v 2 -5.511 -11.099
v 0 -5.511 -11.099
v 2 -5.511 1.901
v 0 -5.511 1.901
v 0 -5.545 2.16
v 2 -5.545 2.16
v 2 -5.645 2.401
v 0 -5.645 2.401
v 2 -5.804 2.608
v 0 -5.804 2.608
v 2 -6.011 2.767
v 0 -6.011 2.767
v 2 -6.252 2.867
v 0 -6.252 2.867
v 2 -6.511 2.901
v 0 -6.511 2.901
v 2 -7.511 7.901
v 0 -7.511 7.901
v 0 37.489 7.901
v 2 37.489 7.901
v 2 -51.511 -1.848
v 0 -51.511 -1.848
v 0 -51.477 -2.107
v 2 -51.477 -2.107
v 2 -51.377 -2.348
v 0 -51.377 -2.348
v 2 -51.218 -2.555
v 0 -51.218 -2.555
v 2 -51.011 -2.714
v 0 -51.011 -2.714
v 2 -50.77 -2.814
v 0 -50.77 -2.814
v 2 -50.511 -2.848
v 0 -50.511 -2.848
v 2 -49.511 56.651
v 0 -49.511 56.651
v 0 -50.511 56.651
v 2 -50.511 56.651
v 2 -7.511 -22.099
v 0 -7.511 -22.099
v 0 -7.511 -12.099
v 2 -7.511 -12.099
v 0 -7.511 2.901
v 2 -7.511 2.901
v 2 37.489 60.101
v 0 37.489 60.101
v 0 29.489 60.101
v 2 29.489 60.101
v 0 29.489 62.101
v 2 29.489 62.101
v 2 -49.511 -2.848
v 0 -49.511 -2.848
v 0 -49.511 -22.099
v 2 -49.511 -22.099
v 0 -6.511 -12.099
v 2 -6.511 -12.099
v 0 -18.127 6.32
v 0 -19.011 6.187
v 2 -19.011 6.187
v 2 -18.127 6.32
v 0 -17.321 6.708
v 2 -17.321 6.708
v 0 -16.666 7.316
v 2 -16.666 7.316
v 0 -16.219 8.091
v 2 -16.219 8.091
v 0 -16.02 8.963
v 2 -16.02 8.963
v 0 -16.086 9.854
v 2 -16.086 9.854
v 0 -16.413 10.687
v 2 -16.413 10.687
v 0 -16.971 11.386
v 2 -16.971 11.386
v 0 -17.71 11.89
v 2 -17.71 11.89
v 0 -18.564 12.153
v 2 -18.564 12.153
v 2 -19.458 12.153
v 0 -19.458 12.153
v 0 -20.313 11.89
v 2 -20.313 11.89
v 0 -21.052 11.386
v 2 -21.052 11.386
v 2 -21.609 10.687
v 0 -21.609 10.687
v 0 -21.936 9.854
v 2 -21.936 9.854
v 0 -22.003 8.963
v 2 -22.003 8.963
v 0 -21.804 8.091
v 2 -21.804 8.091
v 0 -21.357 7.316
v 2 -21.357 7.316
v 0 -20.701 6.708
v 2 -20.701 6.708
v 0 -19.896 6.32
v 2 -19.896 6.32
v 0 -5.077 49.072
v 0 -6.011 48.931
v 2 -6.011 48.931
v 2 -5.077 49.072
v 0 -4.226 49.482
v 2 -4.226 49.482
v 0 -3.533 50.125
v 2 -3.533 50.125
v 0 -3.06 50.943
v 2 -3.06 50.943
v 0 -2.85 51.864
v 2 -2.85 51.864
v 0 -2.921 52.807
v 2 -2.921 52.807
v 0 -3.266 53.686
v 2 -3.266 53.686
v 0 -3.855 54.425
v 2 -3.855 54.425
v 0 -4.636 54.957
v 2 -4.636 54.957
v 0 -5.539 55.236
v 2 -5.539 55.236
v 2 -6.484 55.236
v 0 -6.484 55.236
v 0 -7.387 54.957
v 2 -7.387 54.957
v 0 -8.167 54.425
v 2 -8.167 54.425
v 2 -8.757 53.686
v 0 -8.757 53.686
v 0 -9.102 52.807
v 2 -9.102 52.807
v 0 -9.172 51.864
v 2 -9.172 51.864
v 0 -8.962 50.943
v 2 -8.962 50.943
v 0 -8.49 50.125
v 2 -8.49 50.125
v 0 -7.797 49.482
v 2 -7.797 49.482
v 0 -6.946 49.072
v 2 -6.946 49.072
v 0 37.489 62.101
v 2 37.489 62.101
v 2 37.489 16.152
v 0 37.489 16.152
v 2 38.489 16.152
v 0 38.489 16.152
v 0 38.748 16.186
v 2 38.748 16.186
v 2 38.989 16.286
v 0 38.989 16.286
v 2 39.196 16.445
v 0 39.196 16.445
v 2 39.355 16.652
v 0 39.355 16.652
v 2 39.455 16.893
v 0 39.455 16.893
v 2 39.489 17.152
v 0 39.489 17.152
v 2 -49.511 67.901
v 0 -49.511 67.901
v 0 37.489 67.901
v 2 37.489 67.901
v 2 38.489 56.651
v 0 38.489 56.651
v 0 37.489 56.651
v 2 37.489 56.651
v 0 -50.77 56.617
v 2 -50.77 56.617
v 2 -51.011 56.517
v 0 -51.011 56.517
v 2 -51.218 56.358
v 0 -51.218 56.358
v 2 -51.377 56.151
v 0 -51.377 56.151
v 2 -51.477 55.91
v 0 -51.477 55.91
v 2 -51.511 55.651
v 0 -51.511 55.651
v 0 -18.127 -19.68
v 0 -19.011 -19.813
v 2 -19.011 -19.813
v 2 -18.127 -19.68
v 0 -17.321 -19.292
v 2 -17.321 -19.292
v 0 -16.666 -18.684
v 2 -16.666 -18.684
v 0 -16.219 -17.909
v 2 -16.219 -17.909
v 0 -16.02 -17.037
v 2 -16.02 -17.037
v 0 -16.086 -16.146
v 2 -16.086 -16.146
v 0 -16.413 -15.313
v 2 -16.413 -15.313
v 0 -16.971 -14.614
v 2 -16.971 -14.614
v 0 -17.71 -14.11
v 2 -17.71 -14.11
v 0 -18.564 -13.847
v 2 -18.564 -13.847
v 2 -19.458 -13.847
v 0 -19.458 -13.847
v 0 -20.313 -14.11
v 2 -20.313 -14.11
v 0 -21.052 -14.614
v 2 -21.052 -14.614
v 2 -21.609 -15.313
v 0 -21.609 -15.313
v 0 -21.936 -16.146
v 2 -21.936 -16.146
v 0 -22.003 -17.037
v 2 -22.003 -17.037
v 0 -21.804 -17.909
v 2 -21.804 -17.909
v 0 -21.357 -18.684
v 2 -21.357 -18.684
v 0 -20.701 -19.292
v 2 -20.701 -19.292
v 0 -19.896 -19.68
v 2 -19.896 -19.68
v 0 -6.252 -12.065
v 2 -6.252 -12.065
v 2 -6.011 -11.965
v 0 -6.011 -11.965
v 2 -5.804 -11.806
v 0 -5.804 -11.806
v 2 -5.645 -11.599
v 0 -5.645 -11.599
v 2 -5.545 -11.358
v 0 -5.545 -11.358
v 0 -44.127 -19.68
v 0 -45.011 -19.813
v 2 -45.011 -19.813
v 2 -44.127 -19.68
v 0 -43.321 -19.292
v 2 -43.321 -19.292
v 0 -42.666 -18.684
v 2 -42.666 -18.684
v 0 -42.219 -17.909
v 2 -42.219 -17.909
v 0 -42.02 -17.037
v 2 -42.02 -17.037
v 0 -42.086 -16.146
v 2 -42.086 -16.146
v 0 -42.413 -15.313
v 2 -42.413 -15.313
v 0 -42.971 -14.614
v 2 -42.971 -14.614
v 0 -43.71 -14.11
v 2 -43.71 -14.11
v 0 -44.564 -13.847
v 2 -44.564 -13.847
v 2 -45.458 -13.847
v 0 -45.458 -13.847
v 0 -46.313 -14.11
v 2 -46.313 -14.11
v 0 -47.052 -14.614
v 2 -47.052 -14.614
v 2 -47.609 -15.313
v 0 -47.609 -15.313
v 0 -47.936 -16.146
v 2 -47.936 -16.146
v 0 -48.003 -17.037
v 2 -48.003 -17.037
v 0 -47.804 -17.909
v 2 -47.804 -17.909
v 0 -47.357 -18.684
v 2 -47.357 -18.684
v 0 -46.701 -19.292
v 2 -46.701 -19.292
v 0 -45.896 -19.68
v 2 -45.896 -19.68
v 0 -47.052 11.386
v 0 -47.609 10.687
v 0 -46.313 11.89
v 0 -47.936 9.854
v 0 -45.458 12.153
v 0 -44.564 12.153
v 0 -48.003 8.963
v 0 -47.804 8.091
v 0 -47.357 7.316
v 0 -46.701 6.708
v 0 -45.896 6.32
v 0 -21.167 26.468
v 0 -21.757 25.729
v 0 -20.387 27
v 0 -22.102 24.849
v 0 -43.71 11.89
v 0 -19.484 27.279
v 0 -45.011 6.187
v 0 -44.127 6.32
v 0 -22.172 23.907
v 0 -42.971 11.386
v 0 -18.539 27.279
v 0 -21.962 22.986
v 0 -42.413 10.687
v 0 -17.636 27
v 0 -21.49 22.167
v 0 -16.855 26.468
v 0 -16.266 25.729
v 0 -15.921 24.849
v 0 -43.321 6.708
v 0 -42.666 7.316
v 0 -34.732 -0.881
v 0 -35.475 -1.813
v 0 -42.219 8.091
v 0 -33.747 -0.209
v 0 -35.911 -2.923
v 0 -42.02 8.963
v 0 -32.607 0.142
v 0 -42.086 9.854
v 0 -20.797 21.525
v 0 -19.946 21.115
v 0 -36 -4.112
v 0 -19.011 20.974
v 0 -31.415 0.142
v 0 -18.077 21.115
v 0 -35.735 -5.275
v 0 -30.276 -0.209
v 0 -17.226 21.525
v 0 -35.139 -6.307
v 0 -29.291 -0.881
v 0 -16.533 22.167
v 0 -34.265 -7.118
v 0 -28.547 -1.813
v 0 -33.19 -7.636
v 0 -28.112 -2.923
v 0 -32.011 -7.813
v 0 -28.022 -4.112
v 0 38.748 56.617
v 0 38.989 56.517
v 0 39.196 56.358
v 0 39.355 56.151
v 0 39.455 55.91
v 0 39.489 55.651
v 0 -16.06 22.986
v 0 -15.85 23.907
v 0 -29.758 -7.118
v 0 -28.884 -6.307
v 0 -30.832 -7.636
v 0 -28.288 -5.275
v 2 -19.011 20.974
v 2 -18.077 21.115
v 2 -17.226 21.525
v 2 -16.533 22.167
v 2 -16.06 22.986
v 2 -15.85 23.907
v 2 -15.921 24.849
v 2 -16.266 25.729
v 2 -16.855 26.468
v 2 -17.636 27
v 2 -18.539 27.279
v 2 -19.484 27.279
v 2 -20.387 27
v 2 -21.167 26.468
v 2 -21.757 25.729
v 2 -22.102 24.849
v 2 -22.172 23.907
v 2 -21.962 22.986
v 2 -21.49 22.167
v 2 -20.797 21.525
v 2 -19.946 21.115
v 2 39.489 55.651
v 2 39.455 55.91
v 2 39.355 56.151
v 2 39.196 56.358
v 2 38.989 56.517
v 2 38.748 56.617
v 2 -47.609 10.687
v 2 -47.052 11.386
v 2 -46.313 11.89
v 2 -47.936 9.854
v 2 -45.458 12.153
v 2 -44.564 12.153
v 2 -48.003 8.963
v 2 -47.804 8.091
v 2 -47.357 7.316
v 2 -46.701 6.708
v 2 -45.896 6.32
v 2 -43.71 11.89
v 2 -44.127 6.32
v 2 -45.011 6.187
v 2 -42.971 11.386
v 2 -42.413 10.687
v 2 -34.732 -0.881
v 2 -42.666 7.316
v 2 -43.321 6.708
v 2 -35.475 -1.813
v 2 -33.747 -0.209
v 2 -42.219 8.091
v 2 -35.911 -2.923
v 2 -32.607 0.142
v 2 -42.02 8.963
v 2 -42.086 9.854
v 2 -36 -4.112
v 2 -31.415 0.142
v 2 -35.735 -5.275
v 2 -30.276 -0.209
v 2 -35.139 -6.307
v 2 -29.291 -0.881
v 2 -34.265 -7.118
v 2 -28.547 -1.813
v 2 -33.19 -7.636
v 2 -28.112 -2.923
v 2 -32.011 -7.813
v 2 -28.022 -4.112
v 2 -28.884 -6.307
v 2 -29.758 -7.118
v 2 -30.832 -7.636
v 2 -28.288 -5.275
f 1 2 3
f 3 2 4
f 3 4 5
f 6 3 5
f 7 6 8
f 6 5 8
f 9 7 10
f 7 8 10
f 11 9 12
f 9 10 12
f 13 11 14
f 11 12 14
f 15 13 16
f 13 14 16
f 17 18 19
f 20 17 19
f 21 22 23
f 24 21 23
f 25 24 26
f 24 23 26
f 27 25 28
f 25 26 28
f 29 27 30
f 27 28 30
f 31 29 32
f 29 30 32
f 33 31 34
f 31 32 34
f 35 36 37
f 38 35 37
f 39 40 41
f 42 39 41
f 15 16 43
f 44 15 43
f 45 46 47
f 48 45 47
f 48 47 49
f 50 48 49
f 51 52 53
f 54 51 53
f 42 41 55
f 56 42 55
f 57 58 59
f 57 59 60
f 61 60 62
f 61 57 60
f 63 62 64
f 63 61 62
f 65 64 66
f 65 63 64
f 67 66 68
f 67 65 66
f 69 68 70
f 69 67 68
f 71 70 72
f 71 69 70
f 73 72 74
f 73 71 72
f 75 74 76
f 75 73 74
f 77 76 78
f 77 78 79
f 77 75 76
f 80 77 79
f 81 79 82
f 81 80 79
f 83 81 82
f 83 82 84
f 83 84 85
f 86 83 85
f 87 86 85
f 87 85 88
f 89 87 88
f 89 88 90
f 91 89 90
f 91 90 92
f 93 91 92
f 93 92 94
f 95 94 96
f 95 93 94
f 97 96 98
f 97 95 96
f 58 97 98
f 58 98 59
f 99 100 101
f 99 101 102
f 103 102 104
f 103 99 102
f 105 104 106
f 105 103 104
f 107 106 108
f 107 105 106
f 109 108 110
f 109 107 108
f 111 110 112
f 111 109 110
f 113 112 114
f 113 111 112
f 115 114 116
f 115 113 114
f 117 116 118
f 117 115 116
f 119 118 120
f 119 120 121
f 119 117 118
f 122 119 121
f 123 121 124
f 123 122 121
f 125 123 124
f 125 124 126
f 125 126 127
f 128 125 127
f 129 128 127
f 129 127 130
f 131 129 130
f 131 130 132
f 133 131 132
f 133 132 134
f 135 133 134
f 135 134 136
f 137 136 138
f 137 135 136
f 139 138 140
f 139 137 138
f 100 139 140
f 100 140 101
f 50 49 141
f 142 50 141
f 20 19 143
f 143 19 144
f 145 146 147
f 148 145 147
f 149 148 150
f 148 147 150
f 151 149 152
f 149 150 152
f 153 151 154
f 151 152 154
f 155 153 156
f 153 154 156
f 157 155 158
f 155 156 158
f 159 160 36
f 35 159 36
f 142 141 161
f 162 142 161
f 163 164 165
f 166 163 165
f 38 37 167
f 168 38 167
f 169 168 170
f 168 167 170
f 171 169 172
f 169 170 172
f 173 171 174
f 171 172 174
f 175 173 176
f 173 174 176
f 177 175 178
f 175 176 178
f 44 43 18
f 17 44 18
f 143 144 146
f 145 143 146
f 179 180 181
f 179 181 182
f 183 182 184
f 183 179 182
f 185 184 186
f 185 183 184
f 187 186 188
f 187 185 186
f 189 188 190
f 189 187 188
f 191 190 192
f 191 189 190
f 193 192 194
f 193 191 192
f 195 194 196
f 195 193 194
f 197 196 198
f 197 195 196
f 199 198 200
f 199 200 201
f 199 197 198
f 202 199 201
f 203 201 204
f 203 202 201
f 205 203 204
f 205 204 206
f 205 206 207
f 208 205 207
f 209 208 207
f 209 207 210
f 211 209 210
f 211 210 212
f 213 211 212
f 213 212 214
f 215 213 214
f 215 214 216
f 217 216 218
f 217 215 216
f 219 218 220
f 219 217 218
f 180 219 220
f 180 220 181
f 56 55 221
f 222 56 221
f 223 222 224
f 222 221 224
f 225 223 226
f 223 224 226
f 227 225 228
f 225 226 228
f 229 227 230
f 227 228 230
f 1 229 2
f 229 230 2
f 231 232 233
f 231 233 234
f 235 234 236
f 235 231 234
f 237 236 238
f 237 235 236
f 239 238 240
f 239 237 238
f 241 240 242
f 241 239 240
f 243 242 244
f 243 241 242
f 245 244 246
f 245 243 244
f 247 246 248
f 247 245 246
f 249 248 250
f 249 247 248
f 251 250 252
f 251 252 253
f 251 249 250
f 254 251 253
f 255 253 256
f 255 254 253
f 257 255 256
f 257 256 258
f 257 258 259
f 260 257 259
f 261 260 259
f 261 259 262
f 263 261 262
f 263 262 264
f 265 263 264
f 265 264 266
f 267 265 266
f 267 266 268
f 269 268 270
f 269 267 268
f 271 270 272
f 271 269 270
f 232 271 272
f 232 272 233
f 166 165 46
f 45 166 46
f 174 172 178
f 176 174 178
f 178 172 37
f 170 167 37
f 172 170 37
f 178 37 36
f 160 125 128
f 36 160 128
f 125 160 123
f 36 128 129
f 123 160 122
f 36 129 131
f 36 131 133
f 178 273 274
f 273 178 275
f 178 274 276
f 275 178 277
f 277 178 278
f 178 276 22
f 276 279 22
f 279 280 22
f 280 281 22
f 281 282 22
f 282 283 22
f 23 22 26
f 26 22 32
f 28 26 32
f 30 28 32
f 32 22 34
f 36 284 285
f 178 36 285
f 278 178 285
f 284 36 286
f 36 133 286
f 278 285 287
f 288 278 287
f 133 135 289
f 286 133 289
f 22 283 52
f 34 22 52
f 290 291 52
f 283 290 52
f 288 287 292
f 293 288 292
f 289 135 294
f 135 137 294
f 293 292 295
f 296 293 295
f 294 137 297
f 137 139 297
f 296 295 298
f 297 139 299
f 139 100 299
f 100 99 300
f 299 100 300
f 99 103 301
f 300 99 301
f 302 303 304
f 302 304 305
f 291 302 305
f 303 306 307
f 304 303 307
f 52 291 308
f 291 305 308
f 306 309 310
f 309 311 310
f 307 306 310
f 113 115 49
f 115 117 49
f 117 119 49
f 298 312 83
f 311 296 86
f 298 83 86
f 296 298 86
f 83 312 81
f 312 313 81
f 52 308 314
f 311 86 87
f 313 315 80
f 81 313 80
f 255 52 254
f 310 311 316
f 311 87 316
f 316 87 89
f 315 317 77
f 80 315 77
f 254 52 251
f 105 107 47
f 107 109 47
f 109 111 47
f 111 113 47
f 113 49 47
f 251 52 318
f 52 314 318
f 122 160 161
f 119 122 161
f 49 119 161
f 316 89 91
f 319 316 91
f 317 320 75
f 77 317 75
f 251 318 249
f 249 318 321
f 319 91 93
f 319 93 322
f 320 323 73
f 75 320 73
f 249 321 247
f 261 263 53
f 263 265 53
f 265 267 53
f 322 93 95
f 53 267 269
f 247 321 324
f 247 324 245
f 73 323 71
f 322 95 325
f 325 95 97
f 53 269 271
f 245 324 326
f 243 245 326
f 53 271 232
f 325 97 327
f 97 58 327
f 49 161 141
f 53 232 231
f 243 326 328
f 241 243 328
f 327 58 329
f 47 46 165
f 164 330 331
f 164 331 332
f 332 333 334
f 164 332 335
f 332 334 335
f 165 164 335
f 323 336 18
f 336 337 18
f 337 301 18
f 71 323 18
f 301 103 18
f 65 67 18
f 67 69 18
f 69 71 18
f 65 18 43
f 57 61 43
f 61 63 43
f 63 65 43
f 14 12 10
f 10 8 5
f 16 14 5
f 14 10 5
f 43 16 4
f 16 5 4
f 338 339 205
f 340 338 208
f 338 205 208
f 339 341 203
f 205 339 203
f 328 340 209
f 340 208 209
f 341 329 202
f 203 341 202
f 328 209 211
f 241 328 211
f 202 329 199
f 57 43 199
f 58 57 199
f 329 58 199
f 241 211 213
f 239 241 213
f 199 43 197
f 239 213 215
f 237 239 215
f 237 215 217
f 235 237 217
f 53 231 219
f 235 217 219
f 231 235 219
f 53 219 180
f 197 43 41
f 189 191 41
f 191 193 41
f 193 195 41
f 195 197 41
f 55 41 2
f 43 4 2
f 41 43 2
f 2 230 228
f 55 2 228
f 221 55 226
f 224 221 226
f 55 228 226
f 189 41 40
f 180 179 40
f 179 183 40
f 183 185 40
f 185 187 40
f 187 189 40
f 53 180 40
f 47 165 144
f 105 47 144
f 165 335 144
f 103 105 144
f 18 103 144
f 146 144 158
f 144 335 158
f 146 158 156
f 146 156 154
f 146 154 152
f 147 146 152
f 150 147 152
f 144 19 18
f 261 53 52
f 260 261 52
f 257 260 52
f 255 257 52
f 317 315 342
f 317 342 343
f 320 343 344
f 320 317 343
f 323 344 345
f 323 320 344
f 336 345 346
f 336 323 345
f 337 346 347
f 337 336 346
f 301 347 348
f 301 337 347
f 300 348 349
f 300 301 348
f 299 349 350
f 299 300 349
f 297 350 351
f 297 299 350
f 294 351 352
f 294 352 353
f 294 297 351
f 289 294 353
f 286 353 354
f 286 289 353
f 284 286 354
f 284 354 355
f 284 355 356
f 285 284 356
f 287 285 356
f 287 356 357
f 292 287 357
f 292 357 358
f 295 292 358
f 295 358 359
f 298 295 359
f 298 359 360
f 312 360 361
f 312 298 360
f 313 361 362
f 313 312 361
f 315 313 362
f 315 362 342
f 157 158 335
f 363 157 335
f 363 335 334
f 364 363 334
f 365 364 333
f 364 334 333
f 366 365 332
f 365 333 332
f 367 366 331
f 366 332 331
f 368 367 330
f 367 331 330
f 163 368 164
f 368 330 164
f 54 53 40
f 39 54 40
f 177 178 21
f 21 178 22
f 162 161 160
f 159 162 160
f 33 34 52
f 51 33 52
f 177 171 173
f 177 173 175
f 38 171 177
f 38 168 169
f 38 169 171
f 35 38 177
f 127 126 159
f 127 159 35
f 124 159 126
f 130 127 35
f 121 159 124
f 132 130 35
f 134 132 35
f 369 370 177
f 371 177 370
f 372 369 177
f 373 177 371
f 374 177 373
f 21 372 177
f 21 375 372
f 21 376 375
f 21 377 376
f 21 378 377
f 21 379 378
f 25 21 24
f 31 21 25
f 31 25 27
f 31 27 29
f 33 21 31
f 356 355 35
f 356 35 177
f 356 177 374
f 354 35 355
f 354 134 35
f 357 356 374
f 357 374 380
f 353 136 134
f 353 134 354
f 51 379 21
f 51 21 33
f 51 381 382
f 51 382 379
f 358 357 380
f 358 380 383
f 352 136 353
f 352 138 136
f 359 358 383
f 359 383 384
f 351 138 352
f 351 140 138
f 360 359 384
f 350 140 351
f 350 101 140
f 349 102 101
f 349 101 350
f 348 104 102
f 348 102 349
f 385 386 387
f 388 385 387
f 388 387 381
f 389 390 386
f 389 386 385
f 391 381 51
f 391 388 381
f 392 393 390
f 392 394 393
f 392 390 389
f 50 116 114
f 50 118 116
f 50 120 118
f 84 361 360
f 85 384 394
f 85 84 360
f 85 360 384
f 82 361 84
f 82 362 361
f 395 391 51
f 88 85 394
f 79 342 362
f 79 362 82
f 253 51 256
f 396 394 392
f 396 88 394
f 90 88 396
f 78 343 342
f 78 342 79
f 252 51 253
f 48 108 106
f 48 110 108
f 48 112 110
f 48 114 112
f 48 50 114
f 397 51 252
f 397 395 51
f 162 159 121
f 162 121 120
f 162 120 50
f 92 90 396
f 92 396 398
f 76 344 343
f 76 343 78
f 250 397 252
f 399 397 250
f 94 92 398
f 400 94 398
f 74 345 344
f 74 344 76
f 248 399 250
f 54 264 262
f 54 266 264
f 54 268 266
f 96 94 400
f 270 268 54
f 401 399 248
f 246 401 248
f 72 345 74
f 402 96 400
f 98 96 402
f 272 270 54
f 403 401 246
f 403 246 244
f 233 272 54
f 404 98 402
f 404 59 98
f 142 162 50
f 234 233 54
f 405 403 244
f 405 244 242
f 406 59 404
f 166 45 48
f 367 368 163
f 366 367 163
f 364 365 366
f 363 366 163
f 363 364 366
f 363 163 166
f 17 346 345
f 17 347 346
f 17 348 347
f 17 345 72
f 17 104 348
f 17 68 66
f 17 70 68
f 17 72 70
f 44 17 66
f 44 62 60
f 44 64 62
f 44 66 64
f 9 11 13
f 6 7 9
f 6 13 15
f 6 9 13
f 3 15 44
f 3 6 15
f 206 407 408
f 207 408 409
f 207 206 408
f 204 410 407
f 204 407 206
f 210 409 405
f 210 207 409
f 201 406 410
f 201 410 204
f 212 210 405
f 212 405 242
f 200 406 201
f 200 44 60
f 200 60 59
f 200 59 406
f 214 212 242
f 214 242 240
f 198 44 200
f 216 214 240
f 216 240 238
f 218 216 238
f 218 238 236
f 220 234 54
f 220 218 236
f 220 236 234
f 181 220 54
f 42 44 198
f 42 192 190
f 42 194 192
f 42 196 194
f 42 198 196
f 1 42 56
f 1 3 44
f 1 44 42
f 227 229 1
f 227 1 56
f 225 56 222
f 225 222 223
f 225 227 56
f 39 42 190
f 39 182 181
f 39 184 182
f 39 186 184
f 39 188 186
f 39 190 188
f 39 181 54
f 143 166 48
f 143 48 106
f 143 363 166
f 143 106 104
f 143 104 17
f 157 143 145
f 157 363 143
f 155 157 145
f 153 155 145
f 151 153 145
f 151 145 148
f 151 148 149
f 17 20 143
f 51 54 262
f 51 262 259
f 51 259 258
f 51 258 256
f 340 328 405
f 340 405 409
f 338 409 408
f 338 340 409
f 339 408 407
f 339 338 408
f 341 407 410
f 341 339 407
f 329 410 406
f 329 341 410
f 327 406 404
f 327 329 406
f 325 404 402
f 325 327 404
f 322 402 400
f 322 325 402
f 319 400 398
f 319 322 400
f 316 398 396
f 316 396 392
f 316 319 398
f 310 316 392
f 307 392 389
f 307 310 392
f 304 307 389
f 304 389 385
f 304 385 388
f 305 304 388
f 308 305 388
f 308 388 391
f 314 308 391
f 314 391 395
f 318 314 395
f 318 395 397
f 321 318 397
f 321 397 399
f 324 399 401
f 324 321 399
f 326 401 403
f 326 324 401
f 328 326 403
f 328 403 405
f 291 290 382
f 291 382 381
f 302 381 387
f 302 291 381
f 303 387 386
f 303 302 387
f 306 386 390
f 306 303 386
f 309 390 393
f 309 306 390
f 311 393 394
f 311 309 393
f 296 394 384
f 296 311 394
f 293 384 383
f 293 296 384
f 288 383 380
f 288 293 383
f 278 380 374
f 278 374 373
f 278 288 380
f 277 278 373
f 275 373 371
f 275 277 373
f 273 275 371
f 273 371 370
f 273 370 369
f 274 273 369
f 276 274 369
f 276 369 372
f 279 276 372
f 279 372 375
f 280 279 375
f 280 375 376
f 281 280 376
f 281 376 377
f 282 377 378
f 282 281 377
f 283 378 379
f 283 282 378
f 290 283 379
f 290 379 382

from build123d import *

# Parameters (mm, degrees)
SKETCH1_R           = 4
SKETCH1_R_2         = 3
SKETCH1_R_3         = 3.17
BOSS_EXTRUDE1_DEPTH = 2


with BuildPart() as part:
    # Sketch1 → Boss-Extrude1 (new body)
    with BuildSketch(Plane(origin=(0, 0, 0), x_dir=(0, 0, -1), z_dir=(1, 0, 0))):
        with BuildLine():
            Line((22.098803657, -49.511248032), (22.098803657, -7.511248032))
            Line((22.098803657, -7.511248032), (12.098803657, -7.511248032))
            Line((12.098803657, -7.511248032), (12.098803657, -6.511248032))
            ThreePointArc((12.098803657, -6.511248032), (11.805910438, -5.804141251), (11.098803657, -5.511248032))
            Line((11.098803657, -5.511248032), (-1.901196343, -5.511248032))
            ThreePointArc((-1.901196343, -5.511248032), (-2.608303125, -5.804141251), (-2.901196343, -6.511248032))
            Line((-2.901196343, -6.511248032), (-2.901196343, -7.511248032))
            Line((-2.901196343, -7.511248032), (-7.901196343, -7.511248032))
            Line((-7.901196343, -7.511248032), (-7.901196343, 37.488751968))
            Line((-7.901196343, 37.488751968), (-16.151705215, 37.488751968))
            Line((-16.151705215, 37.488751968), (-16.151705215, 38.488751968))
            ThreePointArc((-16.151705215, 38.488751968), (-16.444598434, 39.195858749), (-17.151705215, 39.488751968))
            Line((-17.151705215, 39.488751968), (-55.650687472, 39.488751968))
            ThreePointArc((-55.650687472, 39.488751968), (-56.357794253, 39.195858749), (-56.650687472, 38.488751968))
            Line((-56.650687472, 38.488751968), (-56.650687472, 37.488751968))
            Line((-56.650687472, 37.488751968), (-60.101196343, 37.488751968))
            Line((-60.101196343, 37.488751968), (-60.101196343, 29.488751968))
            Line((-60.101196343, 29.488751968), (-62.101196343, 29.488751968))
            Line((-62.101196343, 29.488751968), (-62.101196343, 37.488751968))
            Line((-62.101196343, 37.488751968), (-67.901196343, 37.488751968))
            Line((-67.901196343, 37.488751968), (-67.901196343, -49.511248032))
            Line((-67.901196343, -49.511248032), (-56.650687472, -49.511248032))
            Line((-56.650687472, -49.511248032), (-56.650687472, -50.511248032))
            ThreePointArc((-56.650687472, -50.511248032), (-56.357794253, -51.218354813), (-55.650687472, -51.511248032))
            Line((-55.650687472, -51.511248032), (1.848294785, -51.511248032))
            ThreePointArc((1.848294785, -51.511248032), (2.555401566, -51.218354813), (2.848294785, -50.511248032))
            Line((2.848294785, -50.511248032), (2.848294785, -49.511248032))
            Line((2.848294785, -49.511248032), (22.098803657, -49.511248032))
        make_face()
        with Locations((3.81328303, -32.011248032)):
            Circle(SKETCH1_R, mode=Mode.SUBTRACT)
        with Locations((-9.18671697, -19.011248032)):
            Circle(SKETCH1_R_2, mode=Mode.SUBTRACT)
        with Locations((16.81328303, -19.011248032)):
            Circle(SKETCH1_R_2, mode=Mode.SUBTRACT)
        with Locations((16.81328303, -45.011248032)):
            Circle(SKETCH1_R_2, mode=Mode.SUBTRACT)
        with Locations((-9.18671697, -45.011248032)):
            Circle(SKETCH1_R_2, mode=Mode.SUBTRACT)
        with Locations((-52.101196343, -6.011248032)):
            Circle(SKETCH1_R_3, mode=Mode.SUBTRACT)
        with Locations((-24.143956657, -19.011248032)):
            Circle(SKETCH1_R_3, mode=Mode.SUBTRACT)
    extrude(amount=BOSS_EXTRUDE1_DEPTH)


solid = part.part
